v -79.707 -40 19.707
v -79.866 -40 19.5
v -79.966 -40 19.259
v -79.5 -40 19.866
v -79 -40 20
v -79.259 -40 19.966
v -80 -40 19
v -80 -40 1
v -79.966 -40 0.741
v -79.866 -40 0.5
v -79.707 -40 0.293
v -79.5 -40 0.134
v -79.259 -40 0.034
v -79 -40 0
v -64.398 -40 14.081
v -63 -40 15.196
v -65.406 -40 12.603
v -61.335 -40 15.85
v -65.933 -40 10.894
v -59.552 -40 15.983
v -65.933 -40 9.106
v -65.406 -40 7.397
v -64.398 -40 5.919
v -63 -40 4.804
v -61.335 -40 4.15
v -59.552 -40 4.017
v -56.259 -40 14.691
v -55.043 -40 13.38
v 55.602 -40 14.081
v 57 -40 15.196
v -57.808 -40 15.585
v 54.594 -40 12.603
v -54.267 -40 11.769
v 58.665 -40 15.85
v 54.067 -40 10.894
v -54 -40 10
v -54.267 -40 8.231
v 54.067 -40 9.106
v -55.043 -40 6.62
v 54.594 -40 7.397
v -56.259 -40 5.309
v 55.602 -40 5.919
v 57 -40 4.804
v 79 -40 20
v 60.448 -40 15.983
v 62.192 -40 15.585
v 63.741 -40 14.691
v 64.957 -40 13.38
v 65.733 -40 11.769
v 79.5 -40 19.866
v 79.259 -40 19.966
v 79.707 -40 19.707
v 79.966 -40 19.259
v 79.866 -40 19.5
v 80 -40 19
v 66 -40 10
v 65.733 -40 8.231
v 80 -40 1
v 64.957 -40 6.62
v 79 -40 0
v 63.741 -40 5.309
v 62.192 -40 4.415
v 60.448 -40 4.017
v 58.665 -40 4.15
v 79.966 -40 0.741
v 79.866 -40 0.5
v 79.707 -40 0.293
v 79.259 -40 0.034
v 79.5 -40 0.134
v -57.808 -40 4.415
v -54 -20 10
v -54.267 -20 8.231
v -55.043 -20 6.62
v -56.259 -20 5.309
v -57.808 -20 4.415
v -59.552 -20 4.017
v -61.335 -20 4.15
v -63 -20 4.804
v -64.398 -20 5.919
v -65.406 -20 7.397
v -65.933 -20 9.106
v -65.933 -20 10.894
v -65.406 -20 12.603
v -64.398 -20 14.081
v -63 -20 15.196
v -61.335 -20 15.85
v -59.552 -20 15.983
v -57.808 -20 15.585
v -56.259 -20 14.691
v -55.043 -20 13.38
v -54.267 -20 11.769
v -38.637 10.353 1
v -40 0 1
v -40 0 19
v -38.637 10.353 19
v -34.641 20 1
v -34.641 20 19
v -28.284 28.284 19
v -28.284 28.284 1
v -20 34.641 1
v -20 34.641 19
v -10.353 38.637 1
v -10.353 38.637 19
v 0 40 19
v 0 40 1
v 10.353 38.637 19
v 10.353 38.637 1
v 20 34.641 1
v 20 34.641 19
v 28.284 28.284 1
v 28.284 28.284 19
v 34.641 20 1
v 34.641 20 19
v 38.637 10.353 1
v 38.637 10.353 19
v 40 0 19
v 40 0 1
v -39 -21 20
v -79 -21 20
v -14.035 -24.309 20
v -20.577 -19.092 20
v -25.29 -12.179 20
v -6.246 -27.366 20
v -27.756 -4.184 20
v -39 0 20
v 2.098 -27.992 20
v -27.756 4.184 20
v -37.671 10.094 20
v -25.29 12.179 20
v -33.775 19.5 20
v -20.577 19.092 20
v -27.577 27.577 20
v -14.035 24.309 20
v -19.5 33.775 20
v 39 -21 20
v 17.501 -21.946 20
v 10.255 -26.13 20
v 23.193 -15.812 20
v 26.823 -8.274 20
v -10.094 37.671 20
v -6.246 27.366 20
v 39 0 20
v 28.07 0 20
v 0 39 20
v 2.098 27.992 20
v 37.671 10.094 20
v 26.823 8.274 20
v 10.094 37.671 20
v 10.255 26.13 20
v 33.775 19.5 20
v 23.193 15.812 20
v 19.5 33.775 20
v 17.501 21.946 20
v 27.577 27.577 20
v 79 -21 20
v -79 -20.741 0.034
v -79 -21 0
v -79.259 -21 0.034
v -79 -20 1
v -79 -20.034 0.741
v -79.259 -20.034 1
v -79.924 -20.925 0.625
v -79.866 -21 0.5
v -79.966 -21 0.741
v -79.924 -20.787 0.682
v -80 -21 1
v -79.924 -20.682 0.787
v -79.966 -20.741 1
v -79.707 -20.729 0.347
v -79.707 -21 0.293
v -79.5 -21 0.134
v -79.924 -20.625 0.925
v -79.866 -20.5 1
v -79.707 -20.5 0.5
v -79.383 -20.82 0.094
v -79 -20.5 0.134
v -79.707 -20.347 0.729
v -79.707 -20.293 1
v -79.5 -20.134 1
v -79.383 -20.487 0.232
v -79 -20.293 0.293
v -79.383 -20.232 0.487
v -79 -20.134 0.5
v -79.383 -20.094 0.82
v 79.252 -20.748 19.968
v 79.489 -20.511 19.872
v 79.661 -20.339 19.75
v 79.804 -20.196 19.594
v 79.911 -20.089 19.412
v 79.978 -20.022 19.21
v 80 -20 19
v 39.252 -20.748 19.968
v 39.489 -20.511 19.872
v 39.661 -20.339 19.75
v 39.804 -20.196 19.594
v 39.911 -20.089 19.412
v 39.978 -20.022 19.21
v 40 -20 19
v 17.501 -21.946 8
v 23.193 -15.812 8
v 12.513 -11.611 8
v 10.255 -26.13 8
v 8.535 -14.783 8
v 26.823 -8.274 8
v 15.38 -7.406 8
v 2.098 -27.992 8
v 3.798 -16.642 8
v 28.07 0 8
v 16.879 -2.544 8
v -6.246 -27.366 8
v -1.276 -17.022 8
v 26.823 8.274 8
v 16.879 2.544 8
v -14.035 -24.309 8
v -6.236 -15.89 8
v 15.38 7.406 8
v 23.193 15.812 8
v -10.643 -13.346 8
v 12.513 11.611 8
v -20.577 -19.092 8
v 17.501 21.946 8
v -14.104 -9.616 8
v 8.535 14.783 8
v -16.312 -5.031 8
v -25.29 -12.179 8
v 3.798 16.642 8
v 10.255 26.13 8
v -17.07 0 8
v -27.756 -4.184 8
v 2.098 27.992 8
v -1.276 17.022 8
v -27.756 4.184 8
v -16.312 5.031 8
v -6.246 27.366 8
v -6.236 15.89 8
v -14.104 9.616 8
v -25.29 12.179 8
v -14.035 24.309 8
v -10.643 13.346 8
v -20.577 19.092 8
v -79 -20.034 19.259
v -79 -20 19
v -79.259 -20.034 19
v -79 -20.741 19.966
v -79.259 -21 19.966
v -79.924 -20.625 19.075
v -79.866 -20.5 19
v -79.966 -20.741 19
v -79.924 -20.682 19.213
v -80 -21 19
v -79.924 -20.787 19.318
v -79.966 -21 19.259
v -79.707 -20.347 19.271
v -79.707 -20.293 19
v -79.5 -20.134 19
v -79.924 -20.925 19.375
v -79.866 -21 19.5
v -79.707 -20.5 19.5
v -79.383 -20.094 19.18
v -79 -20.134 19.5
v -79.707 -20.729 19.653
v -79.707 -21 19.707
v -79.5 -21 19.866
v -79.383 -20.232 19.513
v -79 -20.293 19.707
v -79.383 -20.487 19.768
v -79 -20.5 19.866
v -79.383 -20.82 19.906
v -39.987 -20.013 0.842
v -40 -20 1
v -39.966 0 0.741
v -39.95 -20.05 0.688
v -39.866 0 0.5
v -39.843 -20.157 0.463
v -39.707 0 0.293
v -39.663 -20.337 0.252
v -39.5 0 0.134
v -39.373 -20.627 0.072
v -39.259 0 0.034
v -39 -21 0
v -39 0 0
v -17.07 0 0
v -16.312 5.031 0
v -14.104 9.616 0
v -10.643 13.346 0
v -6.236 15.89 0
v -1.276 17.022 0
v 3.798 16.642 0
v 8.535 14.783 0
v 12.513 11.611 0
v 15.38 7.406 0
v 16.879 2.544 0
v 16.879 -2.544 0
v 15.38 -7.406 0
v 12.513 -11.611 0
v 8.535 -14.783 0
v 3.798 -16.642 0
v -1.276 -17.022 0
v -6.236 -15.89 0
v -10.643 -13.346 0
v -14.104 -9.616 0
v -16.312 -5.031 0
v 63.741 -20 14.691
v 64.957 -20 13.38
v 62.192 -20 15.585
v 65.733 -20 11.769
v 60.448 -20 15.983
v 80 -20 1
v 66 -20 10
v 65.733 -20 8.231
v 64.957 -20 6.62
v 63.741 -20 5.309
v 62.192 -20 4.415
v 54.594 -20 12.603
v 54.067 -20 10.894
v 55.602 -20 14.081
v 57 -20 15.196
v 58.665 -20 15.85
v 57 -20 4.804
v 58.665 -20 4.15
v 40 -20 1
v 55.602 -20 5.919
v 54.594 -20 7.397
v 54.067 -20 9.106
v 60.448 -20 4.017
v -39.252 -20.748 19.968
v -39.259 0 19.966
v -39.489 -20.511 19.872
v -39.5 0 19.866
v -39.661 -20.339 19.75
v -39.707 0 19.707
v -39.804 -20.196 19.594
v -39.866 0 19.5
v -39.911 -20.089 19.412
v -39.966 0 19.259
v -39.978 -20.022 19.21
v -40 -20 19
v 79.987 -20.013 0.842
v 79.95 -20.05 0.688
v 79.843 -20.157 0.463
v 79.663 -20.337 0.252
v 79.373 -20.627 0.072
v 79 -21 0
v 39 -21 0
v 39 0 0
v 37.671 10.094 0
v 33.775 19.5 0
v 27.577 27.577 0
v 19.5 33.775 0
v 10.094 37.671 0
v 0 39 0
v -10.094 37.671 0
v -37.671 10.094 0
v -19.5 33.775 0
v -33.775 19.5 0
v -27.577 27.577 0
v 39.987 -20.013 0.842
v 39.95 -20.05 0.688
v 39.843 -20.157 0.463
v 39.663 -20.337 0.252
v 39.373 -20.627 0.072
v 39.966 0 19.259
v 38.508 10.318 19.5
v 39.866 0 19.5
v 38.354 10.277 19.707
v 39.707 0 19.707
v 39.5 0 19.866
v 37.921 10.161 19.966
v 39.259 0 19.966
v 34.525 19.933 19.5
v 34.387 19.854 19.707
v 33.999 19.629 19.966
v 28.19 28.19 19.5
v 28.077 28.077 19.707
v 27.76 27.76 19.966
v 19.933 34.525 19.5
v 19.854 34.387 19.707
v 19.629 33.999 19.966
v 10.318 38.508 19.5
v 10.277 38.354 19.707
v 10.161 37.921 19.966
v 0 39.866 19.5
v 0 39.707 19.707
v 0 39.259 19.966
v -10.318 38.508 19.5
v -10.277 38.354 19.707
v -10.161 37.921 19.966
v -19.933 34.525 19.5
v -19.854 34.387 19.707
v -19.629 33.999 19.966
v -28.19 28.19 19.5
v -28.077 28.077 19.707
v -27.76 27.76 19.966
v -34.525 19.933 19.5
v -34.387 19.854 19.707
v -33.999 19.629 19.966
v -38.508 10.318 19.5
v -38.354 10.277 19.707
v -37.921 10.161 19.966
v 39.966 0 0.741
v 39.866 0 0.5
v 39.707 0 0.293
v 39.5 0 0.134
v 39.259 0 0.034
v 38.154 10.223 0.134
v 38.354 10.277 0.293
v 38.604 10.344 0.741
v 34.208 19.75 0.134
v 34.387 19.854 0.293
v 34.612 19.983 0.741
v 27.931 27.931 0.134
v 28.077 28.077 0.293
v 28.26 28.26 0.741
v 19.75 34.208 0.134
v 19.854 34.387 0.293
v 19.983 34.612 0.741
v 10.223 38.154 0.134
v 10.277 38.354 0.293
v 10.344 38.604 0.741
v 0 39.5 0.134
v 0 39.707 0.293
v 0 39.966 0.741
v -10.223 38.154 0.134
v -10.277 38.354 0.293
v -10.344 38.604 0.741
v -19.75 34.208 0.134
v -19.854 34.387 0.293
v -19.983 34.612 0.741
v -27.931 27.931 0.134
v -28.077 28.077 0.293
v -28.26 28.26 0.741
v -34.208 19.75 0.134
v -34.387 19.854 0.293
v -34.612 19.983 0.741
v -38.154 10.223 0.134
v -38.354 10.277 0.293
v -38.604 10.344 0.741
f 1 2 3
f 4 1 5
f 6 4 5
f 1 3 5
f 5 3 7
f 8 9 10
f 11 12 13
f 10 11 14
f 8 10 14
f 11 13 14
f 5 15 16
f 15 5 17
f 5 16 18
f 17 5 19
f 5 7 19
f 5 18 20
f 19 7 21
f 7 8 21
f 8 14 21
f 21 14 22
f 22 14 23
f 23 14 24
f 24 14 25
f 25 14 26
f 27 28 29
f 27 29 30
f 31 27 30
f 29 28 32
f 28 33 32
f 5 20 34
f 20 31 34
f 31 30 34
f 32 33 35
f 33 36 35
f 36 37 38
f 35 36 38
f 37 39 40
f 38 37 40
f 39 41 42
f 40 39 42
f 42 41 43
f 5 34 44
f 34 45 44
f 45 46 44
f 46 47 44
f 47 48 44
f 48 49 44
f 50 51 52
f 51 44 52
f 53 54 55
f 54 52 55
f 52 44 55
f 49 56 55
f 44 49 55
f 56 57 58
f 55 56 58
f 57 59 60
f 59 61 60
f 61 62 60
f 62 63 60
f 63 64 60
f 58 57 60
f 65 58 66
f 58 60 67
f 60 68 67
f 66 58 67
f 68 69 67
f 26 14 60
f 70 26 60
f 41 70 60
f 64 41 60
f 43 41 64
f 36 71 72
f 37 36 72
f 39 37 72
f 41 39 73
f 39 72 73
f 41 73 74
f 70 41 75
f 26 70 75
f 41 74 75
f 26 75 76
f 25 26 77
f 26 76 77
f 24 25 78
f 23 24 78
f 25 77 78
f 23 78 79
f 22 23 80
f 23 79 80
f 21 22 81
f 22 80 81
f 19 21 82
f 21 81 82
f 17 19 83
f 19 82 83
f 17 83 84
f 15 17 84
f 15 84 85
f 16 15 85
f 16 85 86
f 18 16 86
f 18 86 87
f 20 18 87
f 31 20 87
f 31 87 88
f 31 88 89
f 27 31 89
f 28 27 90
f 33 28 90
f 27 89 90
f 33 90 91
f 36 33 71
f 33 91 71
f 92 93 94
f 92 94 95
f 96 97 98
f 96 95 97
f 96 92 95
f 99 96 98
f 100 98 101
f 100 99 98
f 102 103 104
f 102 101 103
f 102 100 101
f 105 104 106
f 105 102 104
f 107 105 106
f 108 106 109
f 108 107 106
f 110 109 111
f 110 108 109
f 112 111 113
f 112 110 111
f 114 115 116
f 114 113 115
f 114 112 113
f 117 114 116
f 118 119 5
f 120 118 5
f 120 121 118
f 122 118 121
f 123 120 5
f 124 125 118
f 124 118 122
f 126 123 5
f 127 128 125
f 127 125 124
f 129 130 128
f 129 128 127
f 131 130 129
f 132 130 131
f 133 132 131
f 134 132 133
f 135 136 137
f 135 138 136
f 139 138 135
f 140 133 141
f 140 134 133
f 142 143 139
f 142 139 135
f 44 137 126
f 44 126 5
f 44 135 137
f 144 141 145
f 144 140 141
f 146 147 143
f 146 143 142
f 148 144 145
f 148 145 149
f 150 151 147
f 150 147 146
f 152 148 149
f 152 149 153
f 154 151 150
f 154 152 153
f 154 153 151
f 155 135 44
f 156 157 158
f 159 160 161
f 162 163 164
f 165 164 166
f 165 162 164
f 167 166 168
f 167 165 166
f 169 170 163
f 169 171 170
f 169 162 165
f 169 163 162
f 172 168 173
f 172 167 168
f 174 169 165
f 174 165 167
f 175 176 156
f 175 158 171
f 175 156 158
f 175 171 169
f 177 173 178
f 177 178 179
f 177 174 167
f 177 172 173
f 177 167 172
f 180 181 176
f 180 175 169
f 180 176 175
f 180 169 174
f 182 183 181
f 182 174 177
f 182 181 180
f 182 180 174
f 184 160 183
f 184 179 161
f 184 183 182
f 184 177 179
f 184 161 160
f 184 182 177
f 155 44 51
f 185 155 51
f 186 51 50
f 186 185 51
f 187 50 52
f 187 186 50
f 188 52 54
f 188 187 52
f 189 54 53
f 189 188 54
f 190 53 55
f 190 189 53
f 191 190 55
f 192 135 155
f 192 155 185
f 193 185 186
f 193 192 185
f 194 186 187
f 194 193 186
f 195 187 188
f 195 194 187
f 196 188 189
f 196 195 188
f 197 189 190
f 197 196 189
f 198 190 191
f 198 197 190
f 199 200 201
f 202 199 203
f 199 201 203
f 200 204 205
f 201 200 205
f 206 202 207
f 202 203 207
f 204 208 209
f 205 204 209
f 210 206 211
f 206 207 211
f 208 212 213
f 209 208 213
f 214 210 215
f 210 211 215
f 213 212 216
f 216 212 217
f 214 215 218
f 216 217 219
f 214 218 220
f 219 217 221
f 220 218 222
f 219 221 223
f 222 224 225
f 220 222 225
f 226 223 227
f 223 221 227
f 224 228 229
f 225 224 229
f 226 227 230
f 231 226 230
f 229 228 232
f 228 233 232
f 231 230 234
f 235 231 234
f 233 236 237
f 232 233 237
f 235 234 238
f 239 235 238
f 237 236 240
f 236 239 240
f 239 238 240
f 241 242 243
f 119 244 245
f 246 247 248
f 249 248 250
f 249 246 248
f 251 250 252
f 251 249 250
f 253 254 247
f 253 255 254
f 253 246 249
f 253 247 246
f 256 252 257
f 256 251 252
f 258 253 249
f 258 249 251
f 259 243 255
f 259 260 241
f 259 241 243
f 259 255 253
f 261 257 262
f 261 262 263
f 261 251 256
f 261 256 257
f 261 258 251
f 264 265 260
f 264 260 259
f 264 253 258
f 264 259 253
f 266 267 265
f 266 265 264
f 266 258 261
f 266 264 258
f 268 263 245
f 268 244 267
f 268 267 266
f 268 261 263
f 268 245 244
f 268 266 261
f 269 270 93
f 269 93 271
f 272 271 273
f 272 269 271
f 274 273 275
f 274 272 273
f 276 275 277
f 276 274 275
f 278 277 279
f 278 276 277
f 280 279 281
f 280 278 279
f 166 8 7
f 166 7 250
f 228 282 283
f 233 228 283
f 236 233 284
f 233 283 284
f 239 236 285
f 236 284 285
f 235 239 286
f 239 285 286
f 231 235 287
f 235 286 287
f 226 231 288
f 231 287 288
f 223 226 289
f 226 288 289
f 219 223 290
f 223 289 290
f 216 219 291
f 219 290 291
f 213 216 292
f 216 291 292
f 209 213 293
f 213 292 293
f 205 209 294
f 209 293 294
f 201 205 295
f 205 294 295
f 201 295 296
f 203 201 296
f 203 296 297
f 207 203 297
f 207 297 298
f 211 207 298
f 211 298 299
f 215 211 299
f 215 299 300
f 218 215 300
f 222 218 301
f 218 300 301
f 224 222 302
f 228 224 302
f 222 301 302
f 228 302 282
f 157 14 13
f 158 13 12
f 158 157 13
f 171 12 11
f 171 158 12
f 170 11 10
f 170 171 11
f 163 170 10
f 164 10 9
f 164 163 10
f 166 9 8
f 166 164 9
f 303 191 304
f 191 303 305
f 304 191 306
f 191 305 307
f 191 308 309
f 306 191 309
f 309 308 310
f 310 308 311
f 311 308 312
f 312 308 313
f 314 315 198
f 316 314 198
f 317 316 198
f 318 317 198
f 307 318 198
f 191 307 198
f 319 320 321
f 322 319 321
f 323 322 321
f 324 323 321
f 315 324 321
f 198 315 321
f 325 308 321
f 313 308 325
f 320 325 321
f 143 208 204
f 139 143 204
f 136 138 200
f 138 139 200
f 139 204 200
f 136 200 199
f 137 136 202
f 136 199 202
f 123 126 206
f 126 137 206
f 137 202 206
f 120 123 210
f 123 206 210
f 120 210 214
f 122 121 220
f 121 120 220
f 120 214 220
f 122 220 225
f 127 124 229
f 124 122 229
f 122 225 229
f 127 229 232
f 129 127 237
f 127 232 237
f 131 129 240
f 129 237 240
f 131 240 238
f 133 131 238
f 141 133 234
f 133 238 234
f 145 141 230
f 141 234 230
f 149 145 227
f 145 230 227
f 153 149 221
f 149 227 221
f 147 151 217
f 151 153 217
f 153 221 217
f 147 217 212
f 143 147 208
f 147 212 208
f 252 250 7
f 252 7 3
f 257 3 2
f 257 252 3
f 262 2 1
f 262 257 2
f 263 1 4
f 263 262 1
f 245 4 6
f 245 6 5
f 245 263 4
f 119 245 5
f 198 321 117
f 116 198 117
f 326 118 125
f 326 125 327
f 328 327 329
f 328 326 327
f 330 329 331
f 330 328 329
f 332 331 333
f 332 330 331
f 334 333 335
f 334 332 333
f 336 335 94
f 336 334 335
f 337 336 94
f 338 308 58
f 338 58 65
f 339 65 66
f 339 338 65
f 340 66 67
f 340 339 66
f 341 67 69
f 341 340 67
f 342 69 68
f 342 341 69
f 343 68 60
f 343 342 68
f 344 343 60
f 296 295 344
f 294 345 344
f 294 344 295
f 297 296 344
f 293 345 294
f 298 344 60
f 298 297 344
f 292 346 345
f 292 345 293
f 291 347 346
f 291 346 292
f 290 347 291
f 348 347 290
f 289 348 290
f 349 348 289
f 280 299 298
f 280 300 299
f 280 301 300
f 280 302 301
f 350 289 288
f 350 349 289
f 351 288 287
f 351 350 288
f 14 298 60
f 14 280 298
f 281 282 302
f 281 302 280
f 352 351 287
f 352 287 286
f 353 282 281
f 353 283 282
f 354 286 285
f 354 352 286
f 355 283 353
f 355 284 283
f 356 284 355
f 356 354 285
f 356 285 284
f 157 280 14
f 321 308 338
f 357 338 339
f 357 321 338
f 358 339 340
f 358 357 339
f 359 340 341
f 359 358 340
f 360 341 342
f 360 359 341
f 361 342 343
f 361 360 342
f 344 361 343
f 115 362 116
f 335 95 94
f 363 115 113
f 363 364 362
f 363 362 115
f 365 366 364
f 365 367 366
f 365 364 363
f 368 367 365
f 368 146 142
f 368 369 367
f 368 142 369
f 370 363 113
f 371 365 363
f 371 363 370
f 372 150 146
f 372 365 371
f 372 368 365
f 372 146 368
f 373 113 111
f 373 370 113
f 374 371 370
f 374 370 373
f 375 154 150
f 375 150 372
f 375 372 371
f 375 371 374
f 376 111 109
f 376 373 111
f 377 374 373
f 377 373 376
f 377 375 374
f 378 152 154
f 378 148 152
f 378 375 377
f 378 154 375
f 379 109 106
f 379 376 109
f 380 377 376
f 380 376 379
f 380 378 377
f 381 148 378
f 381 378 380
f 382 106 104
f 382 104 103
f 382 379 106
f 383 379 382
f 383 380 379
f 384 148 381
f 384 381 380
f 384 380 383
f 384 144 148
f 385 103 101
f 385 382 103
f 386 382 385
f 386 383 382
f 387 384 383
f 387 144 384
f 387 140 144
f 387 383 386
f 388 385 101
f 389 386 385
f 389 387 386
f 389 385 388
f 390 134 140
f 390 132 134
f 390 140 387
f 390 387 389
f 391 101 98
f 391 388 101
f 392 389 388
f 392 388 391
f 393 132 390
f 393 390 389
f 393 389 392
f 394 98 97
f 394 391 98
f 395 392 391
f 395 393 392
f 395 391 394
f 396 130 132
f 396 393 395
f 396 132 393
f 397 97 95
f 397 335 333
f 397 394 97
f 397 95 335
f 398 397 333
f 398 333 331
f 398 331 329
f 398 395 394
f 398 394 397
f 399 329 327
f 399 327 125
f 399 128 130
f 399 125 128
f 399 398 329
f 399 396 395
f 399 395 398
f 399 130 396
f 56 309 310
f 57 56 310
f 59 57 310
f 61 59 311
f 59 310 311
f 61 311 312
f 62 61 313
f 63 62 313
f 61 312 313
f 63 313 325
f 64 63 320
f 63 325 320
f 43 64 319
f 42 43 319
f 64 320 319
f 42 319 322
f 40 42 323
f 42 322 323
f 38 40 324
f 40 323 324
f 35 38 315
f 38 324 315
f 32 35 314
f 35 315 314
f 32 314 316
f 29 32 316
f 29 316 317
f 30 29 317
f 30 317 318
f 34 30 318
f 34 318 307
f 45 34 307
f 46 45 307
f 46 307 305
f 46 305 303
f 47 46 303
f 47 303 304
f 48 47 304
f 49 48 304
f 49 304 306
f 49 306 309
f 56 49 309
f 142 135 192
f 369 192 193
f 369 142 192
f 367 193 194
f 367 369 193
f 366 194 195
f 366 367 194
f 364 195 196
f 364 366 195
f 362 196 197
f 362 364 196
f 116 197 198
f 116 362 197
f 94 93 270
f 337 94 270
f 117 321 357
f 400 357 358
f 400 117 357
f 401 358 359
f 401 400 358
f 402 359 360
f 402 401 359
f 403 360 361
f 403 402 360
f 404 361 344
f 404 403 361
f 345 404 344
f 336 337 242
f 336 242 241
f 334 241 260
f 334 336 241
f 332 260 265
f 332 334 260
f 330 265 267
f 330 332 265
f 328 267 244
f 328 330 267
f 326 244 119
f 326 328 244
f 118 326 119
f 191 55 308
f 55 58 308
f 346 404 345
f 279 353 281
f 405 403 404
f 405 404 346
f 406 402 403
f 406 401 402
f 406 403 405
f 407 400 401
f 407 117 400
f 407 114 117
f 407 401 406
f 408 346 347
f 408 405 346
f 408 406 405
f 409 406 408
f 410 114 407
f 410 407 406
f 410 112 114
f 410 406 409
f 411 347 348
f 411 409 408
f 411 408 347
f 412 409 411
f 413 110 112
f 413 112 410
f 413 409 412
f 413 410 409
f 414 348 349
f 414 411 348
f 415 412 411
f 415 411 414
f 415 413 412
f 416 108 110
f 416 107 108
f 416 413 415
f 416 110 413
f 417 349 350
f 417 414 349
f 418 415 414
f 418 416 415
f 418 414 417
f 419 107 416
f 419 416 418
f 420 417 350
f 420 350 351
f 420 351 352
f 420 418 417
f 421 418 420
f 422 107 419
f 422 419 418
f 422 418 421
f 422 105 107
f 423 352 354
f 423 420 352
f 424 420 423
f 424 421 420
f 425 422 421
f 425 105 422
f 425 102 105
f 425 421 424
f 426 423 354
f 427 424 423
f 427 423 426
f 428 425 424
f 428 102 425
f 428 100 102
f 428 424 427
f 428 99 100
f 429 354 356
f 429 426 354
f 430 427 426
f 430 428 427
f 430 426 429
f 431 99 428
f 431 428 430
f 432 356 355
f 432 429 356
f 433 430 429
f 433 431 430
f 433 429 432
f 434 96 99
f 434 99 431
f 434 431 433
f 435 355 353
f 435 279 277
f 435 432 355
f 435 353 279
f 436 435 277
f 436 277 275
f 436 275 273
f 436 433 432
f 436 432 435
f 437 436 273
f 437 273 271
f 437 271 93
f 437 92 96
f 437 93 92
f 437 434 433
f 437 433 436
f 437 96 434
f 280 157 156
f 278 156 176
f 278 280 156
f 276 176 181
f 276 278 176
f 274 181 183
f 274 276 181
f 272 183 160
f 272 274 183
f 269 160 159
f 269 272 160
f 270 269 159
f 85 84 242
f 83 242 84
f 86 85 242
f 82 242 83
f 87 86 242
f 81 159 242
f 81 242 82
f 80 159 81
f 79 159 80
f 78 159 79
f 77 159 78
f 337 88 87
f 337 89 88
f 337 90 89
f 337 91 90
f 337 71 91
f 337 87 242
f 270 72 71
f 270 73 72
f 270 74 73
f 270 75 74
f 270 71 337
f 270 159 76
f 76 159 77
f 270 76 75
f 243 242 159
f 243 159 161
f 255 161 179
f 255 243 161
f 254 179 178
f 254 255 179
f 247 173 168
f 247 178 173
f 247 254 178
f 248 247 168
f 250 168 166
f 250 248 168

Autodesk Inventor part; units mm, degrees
ref_plane "YZ Plane" through (0, 0, 0) normal (1, 0, 0) x (0, 1, 0)
ref_plane "XZ Plane" through (0, 0, 0) normal (0, 1, 0) x (-1, 0, 0)
ref_plane "XY Plane" through (0, 0, 0) normal (0, 0, 1) x (1, 0, 0)
sketch "Sketch6" plane through (0, 0, 0) normal (0, 0, 1) x (1, 0, 0)
  circle A0 centre (0, 0) radius 17.07
  circle A1 centre (0, 0) radius 28.07
  line L0 (-40, -40) -> (40, -40)
  line L1 (40, -40) -> (40, 0)
  line L2 (-40, 0) -> (-40, -40)
  circle A2 centre (0, 0) radius 40
  line L3 (-40, -40) -> (-80, -40)
  line L4 (-80, -40) -> (-80, -20)
  line L5 (-80, -20) -> (-40, -20)
  line L6 (-40, -20) -> (-40, -40)
  line L7 (40, -40) -> (80, -40)
  line L8 (80, -40) -> (80, -20)
  line L9 (80, -20) -> (40, -20)
  line L10 (40, -20) -> (40, -40)
  dimension "d29" = 34.14
  dimension "d30" = 56.14
extrude "Extrusion5" add sketch "Sketch6" along normal blind 20 contours L2 A2 L0 | L3 L4 L5 L2 | A2 L1 L0 | A2 | L1 L9 L8 L7
sketch "Sketch7" plane through (0, 0, 0) normal (0, 0, -1) x (-1, 0, 0)
  circle A0 centre (0, 0) radius 17.07
  circle A1 centre (0, 0) radius 28.07
  dimension "d39" = 34.14
  dimension "d40" = 56.14
extrude "Extrusion6" add sketch "Sketch7" against normal blind 8
sketch "Sketch8" plane through (-80, -20, 0) normal (0, 1, 0) x (1, 0, 0)
  line L0 (0, 0) -> (0, -20) projected
  line L1 (0, -20) -> (160, -20) projected
  line L2 (0, 0) -> (40, 0)
  line L3 (40, 0) -> (40, -20)
  line L4 (40, -20) -> (0, -20)
  line L5 (0, -20) -> (0, 0)
  circle A0 centre (20, -10) radius 6
  point P0 (80, 0)
  dimension "d44" = 12
extrude "Extrusion7" cut sketch "Sketch8" against normal blind 20 contours A0
thread "Thread3" size "M12x1.75" class "6H" standard "ANSI Metric M Profile" full length
sketch "Sketch9" plane through (40, -20, 0) normal (0, 1, 0) x (1, 0, 0)
  line L0 (0, 0) -> (0, -20) projected
  line L1 (40, 0) -> (40, -20) projected
  line L2 (0, 0) -> (40, 0)
  line L3 (40, 0) -> (40, -20)
  line L4 (40, -20) -> (0, -20)
  line L5 (0, -20) -> (0, 0)
  circle A0 centre (20, -10) radius 6
  point P0 (-40, 0)
  dimension "d49" = 12
extrude "Extrusion8" cut sketch "Sketch9" against normal blind 20 contours A0
thread "Thread4" size "M12x1.75" class "6H" standard "ANSI Metric M Profile" full length
fillet "Fillet3" radius 1 15 edges at (-60, -20, 20) (-60, -20, 0) (-80, -20, 10) (-80, -30, 0) (-80, -30, 20) (60, -20, 20) (60, -20, 0) (80, -30, 20) (80, -30, 0) (0, 40, 20) (-40, -10, 20) (40, -10, 20) (0, 40, 0) (-40, -10, 0) (40, -10, 0)
properties part number "Chumacera (pieza extra)"
